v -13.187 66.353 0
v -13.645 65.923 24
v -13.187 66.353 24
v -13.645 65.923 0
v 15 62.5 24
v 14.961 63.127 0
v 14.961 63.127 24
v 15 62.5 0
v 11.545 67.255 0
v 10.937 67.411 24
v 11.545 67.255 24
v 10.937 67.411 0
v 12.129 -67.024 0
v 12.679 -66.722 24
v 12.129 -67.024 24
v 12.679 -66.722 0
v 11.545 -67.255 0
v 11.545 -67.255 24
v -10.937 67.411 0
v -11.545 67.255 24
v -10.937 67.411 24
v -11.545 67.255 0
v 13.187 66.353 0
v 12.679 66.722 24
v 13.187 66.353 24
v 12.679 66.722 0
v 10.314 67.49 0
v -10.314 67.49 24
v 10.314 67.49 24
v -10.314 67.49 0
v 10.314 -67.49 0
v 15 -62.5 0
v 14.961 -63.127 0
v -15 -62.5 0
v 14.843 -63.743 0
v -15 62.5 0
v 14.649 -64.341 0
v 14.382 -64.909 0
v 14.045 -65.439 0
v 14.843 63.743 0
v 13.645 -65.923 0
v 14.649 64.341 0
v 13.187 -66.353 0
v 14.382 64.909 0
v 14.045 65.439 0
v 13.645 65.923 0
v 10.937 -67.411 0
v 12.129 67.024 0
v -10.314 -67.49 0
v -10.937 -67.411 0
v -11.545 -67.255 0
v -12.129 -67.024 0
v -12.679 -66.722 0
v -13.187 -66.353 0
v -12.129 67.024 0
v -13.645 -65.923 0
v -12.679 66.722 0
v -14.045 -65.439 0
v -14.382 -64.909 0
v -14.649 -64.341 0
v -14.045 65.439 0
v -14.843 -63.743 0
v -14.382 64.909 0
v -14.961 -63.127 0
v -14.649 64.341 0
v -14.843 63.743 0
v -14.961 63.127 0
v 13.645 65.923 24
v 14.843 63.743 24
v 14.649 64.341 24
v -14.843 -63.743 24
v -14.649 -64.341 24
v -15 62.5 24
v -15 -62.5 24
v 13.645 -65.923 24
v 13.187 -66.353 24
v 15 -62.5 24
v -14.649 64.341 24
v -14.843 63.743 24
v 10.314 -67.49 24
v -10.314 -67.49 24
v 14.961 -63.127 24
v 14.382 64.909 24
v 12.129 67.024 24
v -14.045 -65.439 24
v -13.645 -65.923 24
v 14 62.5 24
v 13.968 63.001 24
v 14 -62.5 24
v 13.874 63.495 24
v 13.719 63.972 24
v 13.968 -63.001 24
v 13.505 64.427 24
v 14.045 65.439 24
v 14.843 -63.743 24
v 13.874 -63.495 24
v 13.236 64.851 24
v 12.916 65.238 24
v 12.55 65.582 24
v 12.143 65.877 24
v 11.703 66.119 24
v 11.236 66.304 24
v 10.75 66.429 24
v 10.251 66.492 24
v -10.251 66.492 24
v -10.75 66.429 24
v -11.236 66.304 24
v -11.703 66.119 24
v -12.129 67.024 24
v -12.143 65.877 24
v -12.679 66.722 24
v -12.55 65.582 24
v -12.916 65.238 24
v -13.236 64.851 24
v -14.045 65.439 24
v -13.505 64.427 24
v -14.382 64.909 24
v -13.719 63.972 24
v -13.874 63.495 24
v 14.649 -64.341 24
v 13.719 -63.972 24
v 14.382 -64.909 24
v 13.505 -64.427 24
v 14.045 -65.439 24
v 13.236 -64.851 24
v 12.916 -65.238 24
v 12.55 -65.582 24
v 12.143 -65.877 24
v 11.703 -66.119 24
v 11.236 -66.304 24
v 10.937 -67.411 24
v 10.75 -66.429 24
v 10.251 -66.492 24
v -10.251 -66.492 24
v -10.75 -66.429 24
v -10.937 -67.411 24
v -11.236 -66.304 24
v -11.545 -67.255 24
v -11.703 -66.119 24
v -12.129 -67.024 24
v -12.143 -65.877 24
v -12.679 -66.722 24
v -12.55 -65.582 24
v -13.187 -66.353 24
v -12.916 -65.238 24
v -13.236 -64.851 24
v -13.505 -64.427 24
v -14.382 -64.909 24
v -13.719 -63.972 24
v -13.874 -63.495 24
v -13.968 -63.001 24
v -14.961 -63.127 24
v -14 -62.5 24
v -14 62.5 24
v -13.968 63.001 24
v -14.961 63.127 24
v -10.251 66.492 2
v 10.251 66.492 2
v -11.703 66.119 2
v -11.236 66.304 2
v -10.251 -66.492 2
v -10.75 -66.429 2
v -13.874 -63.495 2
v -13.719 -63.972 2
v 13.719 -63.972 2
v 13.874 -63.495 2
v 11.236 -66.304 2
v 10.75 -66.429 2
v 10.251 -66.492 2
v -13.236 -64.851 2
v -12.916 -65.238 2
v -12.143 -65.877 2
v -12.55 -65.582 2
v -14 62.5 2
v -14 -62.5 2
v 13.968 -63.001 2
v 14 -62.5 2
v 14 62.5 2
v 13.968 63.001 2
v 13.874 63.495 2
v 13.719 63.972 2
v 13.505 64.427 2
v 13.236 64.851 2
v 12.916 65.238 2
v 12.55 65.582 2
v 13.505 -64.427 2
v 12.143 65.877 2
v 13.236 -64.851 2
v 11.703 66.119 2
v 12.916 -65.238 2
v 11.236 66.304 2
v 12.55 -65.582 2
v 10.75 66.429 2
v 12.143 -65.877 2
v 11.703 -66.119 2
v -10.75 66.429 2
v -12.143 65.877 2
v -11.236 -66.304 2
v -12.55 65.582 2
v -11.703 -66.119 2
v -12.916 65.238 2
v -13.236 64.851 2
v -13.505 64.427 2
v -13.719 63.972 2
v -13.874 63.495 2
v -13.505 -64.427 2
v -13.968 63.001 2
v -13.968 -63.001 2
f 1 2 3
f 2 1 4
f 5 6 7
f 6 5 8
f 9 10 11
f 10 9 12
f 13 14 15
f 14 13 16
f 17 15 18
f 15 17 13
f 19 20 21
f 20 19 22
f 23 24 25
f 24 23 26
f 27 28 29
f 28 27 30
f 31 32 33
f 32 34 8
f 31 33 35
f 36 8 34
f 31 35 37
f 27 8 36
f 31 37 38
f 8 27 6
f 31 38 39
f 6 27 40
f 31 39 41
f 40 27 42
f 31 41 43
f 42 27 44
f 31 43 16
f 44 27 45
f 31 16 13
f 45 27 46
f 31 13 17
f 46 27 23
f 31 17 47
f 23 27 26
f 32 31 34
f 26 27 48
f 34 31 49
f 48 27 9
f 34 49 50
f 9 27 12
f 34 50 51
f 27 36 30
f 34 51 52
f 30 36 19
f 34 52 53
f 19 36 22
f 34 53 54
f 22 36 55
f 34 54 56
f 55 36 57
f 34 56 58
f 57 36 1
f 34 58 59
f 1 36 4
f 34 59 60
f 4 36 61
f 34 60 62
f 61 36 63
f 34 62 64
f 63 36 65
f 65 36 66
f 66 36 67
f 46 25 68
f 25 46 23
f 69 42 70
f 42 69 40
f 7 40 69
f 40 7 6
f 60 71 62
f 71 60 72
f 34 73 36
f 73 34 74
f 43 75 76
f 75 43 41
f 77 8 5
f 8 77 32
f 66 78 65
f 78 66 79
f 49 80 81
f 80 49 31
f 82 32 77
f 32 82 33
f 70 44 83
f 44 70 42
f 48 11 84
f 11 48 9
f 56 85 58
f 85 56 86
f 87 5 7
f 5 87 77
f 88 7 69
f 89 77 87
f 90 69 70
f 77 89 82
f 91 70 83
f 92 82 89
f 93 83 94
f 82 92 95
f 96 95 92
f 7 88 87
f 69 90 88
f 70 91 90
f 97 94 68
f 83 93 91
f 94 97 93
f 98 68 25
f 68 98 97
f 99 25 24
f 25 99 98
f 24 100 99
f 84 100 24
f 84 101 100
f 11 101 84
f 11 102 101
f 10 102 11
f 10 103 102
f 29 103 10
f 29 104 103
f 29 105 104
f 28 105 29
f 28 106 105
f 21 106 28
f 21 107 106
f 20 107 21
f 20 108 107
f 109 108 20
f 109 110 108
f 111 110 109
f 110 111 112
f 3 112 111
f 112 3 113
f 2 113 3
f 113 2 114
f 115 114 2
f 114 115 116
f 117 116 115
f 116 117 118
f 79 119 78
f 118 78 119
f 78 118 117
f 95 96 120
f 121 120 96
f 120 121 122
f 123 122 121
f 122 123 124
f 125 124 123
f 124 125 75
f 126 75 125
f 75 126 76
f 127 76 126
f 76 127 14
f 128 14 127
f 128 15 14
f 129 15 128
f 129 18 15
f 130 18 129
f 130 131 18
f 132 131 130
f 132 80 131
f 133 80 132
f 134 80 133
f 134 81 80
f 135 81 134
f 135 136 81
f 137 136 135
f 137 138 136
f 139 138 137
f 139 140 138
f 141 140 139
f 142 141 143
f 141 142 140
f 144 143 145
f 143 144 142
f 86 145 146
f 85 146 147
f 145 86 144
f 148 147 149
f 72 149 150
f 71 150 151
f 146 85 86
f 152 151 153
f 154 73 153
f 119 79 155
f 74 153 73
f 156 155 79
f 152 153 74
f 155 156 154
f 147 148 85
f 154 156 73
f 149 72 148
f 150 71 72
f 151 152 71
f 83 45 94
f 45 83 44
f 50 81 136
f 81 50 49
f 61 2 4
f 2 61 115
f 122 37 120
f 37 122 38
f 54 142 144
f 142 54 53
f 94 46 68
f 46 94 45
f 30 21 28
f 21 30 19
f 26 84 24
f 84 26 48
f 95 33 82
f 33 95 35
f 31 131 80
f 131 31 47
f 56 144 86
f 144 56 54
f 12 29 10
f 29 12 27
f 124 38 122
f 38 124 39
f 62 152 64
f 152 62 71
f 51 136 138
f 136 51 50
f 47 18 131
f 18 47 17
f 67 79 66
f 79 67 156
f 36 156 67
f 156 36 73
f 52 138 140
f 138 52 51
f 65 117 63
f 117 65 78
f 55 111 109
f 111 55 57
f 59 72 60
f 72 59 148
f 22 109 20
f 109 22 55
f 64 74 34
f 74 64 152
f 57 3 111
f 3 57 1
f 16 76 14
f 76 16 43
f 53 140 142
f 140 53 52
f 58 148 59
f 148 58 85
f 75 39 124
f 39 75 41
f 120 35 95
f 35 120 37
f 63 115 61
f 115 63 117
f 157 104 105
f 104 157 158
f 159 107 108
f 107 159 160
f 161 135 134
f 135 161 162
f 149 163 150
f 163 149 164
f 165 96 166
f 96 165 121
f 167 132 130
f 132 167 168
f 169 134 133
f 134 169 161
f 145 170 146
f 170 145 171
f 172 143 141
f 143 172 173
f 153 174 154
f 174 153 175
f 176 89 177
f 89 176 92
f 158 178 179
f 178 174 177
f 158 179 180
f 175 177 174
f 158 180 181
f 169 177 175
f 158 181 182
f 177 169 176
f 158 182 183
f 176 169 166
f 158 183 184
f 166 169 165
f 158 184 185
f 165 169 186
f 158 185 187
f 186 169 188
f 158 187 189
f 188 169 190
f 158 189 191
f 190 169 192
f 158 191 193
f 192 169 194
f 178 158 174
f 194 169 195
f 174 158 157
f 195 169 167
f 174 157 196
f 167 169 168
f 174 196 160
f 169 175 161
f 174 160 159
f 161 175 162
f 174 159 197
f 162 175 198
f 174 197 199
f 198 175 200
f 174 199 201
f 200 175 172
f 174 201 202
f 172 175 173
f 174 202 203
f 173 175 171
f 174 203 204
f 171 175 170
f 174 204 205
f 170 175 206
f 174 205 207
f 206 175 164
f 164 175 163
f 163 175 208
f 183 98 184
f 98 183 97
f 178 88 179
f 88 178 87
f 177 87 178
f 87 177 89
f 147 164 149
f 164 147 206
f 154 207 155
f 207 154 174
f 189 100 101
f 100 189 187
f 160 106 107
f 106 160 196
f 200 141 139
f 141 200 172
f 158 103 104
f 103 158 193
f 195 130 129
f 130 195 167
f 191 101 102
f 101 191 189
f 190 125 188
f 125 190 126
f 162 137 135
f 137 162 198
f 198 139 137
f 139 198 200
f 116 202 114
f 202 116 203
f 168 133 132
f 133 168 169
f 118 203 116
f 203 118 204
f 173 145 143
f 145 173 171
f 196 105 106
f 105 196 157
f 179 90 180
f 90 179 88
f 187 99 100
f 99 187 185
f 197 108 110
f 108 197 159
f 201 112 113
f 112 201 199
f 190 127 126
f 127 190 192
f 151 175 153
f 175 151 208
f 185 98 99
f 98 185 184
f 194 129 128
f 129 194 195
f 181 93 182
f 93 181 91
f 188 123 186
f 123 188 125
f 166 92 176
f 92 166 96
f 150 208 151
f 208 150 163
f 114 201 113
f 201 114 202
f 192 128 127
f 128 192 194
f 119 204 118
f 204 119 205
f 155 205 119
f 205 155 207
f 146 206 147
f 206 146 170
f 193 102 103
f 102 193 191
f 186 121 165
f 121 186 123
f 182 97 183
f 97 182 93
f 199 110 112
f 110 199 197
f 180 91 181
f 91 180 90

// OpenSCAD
$fn = 50;


difference() {
	union() {
		hull() {
			translate(v = [-10.0000000000, 62.5000000000, 0]) {
				cylinder(h = 24, r = 5);
			}
			translate(v = [10.0000000000, 62.5000000000, 0]) {
				cylinder(h = 24, r = 5);
			}
			translate(v = [-10.0000000000, -62.5000000000, 0]) {
				cylinder(h = 24, r = 5);
			}
			translate(v = [10.0000000000, -62.5000000000, 0]) {
				cylinder(h = 24, r = 5);
			}
		}
	}
	union() {
		translate(v = [0, 0, 2]) {
			hull() {
				translate(v = [-10.0000000000, 62.5000000000, 0]) {
					cylinder(h = 22, r = 4);
				}
				translate(v = [10.0000000000, 62.5000000000, 0]) {
					cylinder(h = 22, r = 4);
				}
				translate(v = [-10.0000000000, -62.5000000000, 0]) {
					cylinder(h = 22, r = 4);
				}
				translate(v = [10.0000000000, -62.5000000000, 0]) {
					cylinder(h = 22, r = 4);
				}
			}
		}
	}
}
